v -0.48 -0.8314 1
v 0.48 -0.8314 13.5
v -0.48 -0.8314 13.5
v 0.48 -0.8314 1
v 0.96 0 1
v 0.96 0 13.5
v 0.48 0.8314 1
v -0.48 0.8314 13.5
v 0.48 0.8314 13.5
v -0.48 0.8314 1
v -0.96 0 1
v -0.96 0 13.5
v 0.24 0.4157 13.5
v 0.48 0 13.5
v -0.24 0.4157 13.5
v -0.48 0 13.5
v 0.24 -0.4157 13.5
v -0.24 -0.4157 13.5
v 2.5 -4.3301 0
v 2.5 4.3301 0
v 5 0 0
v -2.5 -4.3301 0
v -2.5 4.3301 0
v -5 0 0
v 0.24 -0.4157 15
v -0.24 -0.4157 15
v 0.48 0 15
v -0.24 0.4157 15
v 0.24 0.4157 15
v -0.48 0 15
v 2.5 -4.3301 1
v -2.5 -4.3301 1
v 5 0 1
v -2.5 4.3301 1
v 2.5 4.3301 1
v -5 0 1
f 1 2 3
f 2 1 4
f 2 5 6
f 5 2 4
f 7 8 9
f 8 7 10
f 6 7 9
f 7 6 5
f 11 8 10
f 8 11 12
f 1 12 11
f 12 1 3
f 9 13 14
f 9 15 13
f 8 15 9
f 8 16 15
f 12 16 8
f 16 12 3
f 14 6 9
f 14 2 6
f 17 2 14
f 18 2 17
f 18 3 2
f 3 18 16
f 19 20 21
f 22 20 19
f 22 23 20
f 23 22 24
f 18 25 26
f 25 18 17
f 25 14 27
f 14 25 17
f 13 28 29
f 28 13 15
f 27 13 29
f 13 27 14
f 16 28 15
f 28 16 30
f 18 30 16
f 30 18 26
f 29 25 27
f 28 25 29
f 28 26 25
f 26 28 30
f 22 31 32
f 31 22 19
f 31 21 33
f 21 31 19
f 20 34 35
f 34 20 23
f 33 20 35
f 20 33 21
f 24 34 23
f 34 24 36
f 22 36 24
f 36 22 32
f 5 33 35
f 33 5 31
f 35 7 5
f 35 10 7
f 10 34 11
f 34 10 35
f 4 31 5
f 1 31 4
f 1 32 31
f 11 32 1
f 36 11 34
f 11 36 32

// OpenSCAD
// file: cookie_cutter.scad
module dxf(file, layer, height) {
   linear_extrude(height = height)
       import(file = file, layer = layer);
}

module needle(height, thin1, thin2) {
   union() {
      cylinder(r = thin1, h = height-1.5, $fn = 6);
      cylinder(r = thin2, h = height, $fn = 6);
   }
}

module wall(file, layer, height, thin) {
   difference() {
      minkowski() {
        dxf(file, layer, 0.01);
        cylinder(r = thin, h = height, $fn = 6);
      }
      translate([0, 0, -1]) dxf(file, layer, height + 2);
   }
}

module cutter(file, layer, height, nozzle_diameter) {
   thin1 = nozzle_diameter * 2.4;
   thin2 = nozzle_diameter * 1.2;
   difference() {
      minkowski() {
        dxf(file, layer, 0.01);
        needle(height, thin1, thin2);
      }
      translate([0, 0, -1]) dxf(file, layer, height + 2);
   }
}

module cookie_cutter(file, height, join_height, nozzle_diameter) {
   union () {
      cutter(file, "cutter", height, nozzle_diameter);
      wall(file, "outer", 1, 5);
      linear_extrude(height = join_height)
         import(file = file, layer = "join");
   }
}
// main file
include <cookie_cutter.scad>;
cookie_cutter("star_hollow.dxf", 15, 3.5, 0.4);
